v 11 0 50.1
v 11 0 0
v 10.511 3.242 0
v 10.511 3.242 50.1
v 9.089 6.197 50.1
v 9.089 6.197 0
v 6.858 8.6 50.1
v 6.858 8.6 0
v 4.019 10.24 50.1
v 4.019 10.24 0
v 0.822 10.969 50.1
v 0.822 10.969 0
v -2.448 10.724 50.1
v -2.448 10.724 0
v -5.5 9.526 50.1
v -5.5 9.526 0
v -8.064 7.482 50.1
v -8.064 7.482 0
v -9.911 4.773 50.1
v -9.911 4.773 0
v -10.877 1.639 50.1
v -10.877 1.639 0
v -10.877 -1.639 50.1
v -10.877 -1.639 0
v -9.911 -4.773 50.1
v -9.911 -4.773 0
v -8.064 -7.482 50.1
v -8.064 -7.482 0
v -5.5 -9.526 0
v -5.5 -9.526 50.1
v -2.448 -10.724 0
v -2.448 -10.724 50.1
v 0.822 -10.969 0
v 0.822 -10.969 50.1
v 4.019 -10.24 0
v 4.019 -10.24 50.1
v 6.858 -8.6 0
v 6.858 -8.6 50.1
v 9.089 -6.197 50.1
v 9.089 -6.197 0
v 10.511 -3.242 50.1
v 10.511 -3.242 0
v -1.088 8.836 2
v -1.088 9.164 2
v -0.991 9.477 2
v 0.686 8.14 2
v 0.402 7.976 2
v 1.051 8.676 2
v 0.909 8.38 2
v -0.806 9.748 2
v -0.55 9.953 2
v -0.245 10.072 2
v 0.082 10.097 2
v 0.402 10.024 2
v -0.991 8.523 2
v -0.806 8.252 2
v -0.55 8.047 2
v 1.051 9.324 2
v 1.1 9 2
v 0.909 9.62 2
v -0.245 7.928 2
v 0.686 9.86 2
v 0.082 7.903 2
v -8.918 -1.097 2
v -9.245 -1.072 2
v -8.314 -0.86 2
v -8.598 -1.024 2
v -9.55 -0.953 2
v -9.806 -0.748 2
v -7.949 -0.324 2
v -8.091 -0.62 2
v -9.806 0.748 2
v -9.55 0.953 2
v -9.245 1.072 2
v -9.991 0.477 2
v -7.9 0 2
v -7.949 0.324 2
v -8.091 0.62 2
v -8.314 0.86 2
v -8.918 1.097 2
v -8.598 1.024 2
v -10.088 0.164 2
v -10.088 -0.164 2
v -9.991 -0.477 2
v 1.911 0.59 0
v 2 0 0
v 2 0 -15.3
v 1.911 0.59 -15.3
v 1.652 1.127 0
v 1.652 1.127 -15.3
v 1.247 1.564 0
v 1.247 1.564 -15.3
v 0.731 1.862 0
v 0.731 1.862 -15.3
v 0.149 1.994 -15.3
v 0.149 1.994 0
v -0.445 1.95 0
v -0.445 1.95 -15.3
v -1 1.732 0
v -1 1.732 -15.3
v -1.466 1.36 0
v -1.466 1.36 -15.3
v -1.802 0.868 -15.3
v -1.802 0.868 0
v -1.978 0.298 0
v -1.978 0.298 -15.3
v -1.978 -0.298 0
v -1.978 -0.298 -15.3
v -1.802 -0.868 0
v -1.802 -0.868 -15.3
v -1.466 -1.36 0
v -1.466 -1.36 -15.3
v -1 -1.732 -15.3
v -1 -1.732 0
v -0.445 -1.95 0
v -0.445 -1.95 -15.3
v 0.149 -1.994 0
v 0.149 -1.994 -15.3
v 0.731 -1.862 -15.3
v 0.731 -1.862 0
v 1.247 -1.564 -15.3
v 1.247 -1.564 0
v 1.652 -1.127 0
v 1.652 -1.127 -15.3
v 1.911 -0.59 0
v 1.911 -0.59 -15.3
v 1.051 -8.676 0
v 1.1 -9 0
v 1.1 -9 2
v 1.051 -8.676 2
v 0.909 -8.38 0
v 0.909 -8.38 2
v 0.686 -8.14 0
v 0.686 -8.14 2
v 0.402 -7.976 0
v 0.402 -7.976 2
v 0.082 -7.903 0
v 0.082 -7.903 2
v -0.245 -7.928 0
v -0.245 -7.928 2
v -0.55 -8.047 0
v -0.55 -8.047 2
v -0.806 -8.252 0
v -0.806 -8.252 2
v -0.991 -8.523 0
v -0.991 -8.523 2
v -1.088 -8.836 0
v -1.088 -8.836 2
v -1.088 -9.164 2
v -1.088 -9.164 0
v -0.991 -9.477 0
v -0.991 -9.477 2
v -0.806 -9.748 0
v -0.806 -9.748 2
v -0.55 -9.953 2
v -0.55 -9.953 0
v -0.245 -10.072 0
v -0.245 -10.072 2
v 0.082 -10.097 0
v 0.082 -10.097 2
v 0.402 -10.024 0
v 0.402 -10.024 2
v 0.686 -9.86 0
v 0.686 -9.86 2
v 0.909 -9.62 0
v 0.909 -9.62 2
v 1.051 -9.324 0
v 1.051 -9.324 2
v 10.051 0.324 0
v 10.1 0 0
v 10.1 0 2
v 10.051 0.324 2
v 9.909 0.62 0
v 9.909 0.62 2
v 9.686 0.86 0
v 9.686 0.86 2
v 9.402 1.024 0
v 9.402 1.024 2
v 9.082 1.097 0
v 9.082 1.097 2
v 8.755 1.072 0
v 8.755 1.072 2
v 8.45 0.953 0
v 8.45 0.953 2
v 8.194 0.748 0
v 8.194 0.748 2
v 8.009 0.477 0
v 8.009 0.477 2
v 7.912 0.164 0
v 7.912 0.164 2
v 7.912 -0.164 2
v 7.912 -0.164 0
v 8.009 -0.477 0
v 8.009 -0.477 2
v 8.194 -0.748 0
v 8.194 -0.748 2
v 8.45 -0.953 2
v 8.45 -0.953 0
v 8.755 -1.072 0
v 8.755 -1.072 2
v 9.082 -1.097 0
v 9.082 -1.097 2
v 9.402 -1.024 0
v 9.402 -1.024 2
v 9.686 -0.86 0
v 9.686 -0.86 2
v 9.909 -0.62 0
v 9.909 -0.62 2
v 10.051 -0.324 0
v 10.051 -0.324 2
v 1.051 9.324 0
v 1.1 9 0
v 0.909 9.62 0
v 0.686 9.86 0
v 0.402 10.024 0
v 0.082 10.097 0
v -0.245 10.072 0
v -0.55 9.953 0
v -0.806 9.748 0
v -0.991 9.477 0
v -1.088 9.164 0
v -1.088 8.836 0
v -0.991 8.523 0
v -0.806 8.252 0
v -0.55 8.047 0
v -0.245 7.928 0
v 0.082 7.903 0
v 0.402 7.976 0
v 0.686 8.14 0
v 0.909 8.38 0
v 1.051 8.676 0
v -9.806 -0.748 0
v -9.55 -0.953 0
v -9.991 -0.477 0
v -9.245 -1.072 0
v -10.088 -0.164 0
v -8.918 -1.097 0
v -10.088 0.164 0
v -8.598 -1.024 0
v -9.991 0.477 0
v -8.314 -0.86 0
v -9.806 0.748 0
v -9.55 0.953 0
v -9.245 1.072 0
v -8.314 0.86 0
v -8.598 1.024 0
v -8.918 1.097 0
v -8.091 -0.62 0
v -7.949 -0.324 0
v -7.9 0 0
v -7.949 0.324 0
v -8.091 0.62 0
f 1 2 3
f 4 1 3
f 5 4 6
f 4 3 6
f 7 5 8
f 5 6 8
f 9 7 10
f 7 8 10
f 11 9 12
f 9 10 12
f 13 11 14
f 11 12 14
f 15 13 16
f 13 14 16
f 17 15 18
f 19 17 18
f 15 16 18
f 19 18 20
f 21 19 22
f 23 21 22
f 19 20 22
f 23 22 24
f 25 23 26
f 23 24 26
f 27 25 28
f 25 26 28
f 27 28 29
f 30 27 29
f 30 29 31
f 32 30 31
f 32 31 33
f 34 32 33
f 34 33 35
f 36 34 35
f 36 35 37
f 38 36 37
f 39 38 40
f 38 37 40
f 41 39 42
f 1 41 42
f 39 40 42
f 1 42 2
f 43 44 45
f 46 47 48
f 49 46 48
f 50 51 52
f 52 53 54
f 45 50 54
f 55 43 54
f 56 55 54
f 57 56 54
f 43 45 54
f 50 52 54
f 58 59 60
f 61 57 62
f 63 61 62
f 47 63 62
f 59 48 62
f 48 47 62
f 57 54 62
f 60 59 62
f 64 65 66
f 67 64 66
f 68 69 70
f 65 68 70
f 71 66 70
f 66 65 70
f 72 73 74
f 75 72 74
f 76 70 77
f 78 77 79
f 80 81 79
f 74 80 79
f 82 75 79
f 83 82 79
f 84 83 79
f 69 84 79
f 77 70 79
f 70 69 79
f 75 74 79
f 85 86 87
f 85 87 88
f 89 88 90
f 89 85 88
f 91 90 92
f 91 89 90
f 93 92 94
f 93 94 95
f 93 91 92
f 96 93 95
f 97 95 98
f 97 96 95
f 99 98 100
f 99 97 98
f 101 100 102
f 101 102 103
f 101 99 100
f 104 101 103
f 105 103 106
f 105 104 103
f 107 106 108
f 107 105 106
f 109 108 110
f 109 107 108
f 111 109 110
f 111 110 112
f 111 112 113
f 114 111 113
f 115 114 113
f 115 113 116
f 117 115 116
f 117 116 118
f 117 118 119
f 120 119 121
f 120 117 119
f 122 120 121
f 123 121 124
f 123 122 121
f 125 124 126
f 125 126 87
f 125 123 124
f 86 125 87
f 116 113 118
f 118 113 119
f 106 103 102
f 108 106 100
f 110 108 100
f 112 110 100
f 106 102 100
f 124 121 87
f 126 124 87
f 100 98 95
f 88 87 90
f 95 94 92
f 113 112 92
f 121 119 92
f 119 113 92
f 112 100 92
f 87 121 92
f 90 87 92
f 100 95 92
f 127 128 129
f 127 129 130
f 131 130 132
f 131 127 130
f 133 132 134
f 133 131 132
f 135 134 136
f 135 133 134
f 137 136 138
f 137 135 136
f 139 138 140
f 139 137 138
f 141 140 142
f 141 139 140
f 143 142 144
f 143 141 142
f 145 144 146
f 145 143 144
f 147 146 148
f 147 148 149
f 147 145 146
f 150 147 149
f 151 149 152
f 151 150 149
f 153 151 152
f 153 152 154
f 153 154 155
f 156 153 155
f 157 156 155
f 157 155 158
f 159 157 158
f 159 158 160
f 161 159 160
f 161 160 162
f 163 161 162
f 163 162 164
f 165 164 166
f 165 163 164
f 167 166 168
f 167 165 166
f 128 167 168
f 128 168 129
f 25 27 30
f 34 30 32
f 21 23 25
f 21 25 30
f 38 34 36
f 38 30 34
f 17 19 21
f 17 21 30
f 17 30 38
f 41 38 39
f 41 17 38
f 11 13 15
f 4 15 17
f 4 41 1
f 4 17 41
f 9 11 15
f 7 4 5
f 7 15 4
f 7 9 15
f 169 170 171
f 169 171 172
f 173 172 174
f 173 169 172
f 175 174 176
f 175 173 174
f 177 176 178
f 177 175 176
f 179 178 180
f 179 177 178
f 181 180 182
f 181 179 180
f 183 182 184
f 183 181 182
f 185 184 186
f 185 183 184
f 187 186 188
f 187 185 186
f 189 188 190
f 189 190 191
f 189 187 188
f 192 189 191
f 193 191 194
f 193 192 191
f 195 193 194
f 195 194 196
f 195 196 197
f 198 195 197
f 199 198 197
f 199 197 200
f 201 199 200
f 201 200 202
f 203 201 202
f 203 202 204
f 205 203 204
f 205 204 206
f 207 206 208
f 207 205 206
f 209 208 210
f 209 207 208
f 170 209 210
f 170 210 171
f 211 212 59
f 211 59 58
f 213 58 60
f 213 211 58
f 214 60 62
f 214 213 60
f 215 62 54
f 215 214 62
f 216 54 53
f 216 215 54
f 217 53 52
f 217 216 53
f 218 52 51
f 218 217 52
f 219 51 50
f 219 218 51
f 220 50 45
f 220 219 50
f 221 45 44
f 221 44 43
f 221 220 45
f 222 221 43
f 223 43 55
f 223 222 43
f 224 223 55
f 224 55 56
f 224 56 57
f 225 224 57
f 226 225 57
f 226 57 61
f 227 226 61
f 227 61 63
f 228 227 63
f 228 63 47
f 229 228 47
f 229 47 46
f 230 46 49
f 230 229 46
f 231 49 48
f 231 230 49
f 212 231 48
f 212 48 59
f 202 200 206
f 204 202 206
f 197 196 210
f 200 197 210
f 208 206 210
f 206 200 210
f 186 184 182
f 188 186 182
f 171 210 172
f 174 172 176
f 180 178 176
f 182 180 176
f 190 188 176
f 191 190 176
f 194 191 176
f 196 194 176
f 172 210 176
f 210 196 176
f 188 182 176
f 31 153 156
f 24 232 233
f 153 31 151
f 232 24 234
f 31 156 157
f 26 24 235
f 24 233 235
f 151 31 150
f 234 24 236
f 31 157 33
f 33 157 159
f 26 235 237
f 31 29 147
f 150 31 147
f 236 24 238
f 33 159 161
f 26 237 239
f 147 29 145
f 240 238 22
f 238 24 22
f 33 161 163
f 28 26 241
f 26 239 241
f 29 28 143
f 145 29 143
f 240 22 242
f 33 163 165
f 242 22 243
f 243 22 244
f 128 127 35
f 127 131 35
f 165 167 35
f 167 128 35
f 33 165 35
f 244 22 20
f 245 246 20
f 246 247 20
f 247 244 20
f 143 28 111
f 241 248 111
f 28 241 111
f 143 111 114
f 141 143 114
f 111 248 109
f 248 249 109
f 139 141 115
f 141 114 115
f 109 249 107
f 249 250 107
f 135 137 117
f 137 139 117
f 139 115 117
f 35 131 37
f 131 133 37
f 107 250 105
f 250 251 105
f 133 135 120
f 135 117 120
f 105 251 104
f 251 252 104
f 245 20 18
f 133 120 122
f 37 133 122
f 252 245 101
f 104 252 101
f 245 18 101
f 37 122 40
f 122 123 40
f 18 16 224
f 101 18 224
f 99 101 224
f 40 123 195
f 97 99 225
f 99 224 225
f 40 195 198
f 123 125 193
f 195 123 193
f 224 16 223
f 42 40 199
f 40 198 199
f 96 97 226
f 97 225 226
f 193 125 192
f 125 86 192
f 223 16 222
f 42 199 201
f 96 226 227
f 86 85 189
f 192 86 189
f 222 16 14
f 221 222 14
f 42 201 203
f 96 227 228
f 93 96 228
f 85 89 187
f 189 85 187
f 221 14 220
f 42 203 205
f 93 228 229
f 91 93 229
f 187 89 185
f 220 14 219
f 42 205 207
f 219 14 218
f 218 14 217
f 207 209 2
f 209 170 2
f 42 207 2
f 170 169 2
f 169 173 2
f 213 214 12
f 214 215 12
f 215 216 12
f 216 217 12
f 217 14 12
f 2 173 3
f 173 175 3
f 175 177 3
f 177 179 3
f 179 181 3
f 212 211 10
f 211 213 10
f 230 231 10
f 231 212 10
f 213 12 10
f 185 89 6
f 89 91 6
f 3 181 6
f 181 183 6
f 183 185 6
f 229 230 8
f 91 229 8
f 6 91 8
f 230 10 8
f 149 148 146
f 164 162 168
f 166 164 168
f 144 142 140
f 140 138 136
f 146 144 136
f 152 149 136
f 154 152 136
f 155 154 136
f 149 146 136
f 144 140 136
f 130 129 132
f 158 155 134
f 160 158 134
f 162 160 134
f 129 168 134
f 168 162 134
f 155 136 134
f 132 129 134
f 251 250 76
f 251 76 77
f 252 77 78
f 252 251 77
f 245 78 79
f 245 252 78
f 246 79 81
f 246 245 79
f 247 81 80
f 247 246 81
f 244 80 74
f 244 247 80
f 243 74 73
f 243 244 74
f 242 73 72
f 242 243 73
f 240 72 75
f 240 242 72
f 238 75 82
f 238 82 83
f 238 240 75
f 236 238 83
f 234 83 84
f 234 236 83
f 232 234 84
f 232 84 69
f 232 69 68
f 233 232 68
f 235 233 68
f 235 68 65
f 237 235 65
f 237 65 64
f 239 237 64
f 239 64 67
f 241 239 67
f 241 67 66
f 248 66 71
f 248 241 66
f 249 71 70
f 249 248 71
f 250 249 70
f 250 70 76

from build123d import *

# Parameters (mm, degrees)
SKETCH1_R               = 10.999999971
SKETCH1_R_2             = 2
BOSS_EXTRUDE4_DEPTH     = 50.1
SKETCH1_6_R             = 2
BOSS_EXTRUDE5_DEPTH     = 15.3
ADVANCEDHOLE1_OUTLINE_R = 1.1
ADVANCEDHOLE1_DEPTH     = 2


# Read off the part's stored shape, not the designer's step: AdvancedHole1
with BuildPart() as part:
    # Sketch1 → Boss-Extrude4 (new body)
    # profile 1 of 2: a face of its own
    with BuildSketch(Plane.XY):
        Circle(SKETCH1_R)
        Circle(SKETCH1_R_2, mode=Mode.SUBTRACT)
    # profile 2 of 2: a face of its own
    with BuildSketch(Plane.XY):
        Circle(SKETCH1_R_2)
    extrude(amount=BOSS_EXTRUDE4_DEPTH)

    # Sketch1<6> → Boss-Extrude5 (add)
    with BuildSketch(Plane.XY):
        Circle(SKETCH1_6_R)
    extrude(amount=-BOSS_EXTRUDE5_DEPTH)

    # AdvancedHole1 outline → AdvancedHole1 (cut)
    with BuildSketch(Plane.XY):
        with Locations((0, -9)):
            Circle(ADVANCEDHOLE1_OUTLINE_R)
        with Locations((-9, 0)):
            Circle(ADVANCEDHOLE1_OUTLINE_R)
        with Locations((0, 9)):
            Circle(ADVANCEDHOLE1_OUTLINE_R)
        with Locations((9, 0)):
            Circle(ADVANCEDHOLE1_OUTLINE_R)
    extrude(amount=ADVANCEDHOLE1_DEPTH, mode=Mode.SUBTRACT)


solid = part.part
